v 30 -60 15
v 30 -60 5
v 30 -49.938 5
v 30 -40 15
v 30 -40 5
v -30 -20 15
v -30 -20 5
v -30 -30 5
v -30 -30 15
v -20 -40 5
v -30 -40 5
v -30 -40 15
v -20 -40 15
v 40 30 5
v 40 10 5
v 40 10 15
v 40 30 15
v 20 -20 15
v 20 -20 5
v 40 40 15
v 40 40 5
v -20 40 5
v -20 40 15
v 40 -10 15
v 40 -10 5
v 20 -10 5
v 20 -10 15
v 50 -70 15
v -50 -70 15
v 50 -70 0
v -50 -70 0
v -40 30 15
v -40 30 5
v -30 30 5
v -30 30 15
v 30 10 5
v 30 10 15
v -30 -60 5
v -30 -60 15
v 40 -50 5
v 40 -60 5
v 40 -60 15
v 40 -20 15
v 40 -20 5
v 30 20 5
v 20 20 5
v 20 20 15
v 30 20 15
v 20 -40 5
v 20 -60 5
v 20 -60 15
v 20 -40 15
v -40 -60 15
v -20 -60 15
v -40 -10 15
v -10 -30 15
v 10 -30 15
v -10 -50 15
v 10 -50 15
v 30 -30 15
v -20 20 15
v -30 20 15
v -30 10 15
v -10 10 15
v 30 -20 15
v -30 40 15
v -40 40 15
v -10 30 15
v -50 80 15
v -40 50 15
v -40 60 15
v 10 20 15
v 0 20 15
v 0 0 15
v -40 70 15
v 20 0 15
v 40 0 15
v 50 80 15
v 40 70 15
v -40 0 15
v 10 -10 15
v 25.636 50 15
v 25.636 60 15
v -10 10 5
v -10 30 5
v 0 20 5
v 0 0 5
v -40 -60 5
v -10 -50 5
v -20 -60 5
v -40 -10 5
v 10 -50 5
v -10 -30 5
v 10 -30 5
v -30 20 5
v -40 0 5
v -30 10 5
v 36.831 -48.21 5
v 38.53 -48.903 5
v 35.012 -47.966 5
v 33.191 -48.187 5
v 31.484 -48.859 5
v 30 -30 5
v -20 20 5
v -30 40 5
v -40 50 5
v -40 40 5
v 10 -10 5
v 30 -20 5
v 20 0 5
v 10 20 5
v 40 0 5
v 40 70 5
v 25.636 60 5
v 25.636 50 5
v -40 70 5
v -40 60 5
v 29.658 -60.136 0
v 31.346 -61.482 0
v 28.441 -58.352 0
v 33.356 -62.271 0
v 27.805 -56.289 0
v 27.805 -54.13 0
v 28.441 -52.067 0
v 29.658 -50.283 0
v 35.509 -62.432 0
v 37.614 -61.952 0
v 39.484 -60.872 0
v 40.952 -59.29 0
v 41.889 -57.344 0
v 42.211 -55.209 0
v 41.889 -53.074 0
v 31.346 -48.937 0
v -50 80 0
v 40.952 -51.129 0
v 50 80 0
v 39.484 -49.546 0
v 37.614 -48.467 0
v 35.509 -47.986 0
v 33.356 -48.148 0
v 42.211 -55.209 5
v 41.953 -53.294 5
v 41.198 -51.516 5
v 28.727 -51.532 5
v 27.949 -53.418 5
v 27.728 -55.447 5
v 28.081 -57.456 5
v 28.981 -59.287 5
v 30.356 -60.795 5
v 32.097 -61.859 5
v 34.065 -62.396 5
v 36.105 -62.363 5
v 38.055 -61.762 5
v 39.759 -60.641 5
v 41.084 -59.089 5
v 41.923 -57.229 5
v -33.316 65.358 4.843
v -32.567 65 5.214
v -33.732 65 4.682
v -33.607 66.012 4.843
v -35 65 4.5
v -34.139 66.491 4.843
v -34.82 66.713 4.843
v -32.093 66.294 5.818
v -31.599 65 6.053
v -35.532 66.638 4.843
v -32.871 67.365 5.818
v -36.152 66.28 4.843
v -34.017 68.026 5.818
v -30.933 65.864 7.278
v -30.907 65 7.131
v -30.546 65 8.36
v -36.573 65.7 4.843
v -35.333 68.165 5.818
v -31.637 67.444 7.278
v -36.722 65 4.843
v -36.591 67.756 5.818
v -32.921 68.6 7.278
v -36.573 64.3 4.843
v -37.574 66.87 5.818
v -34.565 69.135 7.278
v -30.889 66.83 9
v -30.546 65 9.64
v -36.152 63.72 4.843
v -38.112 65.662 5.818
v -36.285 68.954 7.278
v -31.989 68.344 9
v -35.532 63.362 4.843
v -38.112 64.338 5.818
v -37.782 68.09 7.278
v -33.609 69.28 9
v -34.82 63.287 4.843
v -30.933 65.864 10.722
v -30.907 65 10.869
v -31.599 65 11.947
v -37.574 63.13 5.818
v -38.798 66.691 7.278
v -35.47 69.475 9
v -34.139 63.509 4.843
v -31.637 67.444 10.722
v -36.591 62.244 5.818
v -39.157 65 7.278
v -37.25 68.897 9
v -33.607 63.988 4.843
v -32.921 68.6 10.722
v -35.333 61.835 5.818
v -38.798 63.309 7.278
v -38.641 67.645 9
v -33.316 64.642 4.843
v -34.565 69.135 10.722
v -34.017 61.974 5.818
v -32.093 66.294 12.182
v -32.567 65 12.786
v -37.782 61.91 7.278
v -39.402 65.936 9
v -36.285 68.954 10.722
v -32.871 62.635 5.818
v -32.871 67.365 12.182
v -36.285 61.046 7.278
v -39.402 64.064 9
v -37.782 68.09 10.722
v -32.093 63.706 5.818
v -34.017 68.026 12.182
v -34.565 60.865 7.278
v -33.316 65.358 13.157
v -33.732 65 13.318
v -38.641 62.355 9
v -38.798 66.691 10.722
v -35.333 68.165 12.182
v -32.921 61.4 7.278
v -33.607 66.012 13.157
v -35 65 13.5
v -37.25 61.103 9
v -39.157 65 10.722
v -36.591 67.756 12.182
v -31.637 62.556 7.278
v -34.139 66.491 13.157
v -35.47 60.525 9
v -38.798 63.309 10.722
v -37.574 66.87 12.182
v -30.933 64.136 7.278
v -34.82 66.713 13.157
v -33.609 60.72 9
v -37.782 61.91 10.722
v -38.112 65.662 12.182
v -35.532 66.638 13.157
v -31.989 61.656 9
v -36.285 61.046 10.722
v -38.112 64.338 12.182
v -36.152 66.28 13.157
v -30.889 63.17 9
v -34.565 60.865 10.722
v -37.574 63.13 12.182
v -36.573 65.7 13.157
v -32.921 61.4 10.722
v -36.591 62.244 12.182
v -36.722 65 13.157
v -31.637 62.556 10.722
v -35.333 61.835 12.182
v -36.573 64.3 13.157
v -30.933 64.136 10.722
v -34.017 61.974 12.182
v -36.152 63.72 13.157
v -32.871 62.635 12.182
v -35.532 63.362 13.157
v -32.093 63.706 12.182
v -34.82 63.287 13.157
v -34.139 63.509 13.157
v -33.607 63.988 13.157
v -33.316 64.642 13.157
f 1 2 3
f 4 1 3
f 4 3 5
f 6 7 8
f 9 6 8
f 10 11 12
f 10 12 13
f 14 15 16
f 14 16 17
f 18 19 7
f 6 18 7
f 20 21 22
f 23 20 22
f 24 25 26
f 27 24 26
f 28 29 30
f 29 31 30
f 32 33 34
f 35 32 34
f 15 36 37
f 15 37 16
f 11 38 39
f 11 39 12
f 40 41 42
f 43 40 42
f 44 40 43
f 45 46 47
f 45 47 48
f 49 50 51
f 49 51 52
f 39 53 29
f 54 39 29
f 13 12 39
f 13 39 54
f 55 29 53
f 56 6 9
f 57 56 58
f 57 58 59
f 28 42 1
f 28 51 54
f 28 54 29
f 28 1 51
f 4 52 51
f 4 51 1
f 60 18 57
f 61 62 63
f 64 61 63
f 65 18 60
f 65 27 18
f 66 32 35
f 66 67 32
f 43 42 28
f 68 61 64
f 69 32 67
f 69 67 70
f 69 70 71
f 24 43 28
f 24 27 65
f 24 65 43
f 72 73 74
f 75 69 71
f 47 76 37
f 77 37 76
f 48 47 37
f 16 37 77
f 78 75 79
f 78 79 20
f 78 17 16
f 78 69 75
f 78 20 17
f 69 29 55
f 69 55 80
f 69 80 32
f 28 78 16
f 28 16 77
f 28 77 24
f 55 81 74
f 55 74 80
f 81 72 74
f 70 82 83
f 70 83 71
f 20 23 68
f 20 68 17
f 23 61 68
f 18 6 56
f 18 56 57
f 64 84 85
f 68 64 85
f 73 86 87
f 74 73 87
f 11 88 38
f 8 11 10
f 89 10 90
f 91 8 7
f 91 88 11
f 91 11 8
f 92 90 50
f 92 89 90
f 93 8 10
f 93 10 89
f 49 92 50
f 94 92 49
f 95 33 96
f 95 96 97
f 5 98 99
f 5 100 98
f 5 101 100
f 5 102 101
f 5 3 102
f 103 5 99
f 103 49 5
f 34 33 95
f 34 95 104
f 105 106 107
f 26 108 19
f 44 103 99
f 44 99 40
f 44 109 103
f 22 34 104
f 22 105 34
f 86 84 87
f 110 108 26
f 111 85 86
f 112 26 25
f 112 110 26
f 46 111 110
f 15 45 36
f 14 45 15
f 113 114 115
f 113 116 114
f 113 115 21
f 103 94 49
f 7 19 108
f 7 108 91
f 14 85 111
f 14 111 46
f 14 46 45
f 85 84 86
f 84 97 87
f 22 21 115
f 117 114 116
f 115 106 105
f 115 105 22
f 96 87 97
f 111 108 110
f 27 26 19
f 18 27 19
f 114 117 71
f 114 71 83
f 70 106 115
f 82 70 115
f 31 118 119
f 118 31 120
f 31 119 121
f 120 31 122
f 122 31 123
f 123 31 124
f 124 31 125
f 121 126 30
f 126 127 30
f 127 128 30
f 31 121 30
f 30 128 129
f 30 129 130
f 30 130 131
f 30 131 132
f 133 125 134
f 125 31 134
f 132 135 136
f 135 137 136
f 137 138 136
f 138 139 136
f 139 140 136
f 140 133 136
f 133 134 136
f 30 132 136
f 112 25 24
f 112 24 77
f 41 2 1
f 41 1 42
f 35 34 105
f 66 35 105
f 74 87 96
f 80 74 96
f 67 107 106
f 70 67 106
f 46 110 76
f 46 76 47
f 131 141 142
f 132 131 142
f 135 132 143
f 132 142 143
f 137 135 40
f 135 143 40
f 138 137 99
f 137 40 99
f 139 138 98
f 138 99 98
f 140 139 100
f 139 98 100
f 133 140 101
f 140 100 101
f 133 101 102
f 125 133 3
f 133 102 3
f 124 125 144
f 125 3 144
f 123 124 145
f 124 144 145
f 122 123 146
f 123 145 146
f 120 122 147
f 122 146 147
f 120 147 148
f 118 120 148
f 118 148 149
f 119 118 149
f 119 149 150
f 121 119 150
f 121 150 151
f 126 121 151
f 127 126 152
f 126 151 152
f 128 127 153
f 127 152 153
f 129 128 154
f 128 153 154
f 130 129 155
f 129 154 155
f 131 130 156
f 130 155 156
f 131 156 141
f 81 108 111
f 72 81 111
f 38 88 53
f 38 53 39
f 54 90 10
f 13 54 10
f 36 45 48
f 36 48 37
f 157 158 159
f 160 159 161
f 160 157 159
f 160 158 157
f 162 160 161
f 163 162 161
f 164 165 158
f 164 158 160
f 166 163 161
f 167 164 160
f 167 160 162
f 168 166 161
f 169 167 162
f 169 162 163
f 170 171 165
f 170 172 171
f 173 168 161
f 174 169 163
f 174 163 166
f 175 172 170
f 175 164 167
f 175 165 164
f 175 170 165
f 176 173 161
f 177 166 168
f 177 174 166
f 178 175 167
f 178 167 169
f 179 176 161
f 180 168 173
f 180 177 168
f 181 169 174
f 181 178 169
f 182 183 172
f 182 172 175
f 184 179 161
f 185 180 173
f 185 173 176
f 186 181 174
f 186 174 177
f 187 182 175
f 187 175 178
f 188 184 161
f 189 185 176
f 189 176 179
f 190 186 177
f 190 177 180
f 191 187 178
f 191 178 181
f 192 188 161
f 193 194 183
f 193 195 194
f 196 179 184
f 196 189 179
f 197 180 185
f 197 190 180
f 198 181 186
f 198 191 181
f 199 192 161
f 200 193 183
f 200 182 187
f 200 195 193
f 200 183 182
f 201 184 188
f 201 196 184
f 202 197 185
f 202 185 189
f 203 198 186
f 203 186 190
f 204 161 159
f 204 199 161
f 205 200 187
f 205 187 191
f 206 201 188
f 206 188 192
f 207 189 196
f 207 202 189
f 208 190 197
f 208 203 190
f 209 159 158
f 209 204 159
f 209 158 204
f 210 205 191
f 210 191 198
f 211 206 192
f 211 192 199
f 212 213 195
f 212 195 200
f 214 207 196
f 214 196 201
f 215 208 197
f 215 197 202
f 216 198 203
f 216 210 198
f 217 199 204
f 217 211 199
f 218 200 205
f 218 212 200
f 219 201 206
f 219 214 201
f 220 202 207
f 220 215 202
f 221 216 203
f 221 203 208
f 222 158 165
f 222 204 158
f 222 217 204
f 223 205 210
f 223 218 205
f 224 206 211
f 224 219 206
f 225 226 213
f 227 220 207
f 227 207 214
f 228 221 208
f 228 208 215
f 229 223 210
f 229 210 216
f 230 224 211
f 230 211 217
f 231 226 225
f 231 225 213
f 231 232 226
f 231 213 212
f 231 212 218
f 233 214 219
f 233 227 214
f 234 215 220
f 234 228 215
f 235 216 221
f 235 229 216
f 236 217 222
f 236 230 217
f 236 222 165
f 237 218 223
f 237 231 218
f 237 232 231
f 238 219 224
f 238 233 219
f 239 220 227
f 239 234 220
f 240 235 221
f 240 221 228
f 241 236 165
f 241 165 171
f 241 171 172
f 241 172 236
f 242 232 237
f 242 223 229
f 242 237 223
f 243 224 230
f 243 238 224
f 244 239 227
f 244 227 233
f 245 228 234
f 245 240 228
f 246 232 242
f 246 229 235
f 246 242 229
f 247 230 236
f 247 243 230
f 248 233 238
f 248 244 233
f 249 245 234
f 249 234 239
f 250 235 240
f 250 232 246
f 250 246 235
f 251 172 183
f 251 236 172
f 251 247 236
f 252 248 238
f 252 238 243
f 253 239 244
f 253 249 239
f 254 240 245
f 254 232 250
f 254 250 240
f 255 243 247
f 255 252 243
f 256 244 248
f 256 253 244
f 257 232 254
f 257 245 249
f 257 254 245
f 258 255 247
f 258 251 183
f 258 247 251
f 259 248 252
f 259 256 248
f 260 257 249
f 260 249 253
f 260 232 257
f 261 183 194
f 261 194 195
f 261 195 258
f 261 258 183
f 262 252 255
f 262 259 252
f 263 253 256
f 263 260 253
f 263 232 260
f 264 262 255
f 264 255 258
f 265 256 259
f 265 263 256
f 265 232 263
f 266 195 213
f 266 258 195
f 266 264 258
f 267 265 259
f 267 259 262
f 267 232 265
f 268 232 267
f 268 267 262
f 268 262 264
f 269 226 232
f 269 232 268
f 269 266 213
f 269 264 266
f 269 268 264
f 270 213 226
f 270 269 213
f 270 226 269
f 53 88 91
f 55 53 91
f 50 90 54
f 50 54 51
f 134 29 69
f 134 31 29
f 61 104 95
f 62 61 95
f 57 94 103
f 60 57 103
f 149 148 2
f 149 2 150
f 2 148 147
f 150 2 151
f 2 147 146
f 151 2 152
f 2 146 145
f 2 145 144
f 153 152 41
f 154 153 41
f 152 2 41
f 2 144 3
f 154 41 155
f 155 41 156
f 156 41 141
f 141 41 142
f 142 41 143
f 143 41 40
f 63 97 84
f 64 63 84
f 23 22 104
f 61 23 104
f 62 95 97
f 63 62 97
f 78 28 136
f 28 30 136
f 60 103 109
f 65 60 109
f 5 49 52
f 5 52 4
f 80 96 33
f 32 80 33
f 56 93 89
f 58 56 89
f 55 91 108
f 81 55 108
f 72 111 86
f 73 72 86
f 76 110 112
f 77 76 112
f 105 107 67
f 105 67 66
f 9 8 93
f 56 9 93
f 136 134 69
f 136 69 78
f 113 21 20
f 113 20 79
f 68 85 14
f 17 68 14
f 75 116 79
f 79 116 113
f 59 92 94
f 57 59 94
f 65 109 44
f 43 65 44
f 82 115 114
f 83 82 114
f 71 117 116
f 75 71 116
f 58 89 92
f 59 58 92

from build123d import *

# Parameters (mm, degrees)
SKETCH_W      = 100
SKETCH_H      = 150
PAD_DEPTH     = 5
SKETCH001_W   = 100
SKETCH001_H   = 150
SKETCH001_W_2 = 80
SKETCH001_H_2 = 130
PAD001_DEPTH  = 10
SKETCH002_W   = 65.635862
SKETCH002_H   = 10
SKETCH002_W_2 = 10
SKETCH002_H_2 = 20
PAD002_DEPTH  = 10
SKETCH003_R   = 7.243248
POCKET_DEPTH  = 5.001


with BuildPart() as laberinto_con_salida:
    # Sketch → Pad (new body)
    with BuildSketch(Plane.XY):
        with Locations((0, 5)):
            Rectangle(SKETCH_W, SKETCH_H)
    extrude(amount=PAD_DEPTH)

    # Sketch001 → Pad001 (new body)
    with BuildSketch(Plane.XY.offset(5)):
        with Locations((0, 5)):
            Rectangle(SKETCH001_W, SKETCH001_H)
        with Locations((0, 5)):
            Rectangle(SKETCH001_W_2, SKETCH001_H_2, mode=Mode.SUBTRACT)
    extrude(amount=PAD001_DEPTH)

    # Sketch002 → Pad002 (new body)
    with BuildSketch(Plane.XY.offset(5)):
        with Locations((-7.182069, 55)):
            Rectangle(SKETCH002_W, SKETCH002_H)
        Polygon((40, 40), (-20, 40), (-20, 20), (-30, 20), (-30, 10), (-20, 10), (-10, 10), (-10, 30), (40, 30), align=None)
        with Locations((-35, 35)):
            Rectangle(SKETCH002_W_2, SKETCH002_H)
        Polygon((-40, -10), (10, -10), (10, 0), (10, 20), (0, 20), (0, 0), (-40, 0), align=None)
        Polygon((20, 20), (30, 20), (30, 10), (40, 10), (40, 0), (30, 0), (20, 0), align=None)
        Polygon((40, -10), (20, -10), (20, -20), (-30, -20), (-30, -30), (-10, -30), (-10, -50), (10, -50), (10, -30), (30, -30), (30, -20), (40, -20), align=None)
        with Locations((-25, -50)):
            Rectangle(SKETCH002_W_2, SKETCH002_H_2)
        with Locations((25, -50)):
            Rectangle(SKETCH002_W_2, SKETCH002_H_2)
    extrude(amount=PAD002_DEPTH)

    # Sketch003 → Pocket (cut, through all)
    with BuildSketch(Plane.XY.offset(5)):
        with Locations((34.967426, -55.2094)):
            Circle(SKETCH003_R)
    extrude(amount=-POCKET_DEPTH, mode=Mode.SUBTRACT)


with BuildPart() as bola:
    # Sphere → Sphere (revolve)
    with BuildSketch(Plane(origin=(-35, 65, 9), x_dir=(1, 0, 0), z_dir=(0, -1, 0))):
        with BuildLine():
            ThreePointArc((0, -4.5), (4.5, 0), (0, 4.5))
            Line((0, 4.5), (0, -4.5))
        make_face()
    revolve(axis=Axis((-35, 65, 9), (0, 0, 1)))


solid = Compound([laberinto_con_salida.part, bola.part])
